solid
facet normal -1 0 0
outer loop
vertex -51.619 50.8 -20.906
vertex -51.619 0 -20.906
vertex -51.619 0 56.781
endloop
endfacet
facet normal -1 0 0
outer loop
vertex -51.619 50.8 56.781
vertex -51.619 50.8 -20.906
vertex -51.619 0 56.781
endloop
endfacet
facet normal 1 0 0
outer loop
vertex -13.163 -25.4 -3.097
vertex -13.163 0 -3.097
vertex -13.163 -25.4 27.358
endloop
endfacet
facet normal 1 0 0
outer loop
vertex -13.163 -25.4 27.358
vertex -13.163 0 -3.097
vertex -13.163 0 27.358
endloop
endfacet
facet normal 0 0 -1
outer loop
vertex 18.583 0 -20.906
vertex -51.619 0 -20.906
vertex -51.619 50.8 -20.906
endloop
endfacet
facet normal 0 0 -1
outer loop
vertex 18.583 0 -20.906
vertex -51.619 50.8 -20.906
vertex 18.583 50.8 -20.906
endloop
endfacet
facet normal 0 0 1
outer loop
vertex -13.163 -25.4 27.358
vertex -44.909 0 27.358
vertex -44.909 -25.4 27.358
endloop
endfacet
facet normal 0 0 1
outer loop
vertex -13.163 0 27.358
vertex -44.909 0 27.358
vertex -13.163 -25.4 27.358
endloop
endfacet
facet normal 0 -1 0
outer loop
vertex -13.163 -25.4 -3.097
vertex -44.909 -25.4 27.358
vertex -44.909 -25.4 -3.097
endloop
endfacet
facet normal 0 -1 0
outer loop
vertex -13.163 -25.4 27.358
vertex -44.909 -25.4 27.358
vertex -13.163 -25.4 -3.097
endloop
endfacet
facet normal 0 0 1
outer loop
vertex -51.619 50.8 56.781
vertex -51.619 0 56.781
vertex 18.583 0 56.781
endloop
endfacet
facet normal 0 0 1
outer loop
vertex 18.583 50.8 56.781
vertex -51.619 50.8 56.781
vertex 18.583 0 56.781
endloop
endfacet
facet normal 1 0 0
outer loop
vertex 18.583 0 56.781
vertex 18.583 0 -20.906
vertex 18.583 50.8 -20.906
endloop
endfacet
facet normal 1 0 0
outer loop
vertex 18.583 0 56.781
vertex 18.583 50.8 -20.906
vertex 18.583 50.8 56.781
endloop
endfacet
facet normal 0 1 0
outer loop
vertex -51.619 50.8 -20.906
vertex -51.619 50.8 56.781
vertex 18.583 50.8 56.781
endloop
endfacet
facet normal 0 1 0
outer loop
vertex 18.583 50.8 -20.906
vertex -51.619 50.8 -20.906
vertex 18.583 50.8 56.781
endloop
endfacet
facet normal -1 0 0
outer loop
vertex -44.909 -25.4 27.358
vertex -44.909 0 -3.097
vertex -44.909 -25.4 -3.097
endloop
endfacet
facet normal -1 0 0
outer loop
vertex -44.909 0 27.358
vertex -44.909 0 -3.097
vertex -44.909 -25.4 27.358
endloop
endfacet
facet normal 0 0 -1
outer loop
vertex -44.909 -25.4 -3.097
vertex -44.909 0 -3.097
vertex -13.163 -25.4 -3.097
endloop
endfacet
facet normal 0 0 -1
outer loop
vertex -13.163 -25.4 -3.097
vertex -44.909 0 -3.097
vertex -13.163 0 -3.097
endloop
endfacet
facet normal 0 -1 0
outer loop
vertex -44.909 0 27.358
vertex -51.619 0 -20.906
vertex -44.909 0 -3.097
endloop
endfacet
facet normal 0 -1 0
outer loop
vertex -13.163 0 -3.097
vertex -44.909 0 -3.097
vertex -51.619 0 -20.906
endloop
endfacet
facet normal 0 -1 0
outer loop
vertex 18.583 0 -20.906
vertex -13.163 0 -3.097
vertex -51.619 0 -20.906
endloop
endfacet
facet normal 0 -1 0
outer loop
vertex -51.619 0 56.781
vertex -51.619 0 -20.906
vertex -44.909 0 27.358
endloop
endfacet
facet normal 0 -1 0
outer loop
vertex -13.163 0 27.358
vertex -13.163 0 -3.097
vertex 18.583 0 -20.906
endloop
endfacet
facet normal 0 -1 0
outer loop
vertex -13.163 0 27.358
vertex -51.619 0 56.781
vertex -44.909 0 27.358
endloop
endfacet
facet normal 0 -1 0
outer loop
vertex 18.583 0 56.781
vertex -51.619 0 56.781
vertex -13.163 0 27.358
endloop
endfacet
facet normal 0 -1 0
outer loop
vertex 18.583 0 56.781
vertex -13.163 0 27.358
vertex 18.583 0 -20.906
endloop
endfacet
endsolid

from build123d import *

# Parameters (mm, degrees)
F0_W     = 70.202325
F0_H     = 77.687127
F0_W_2   = 41.811679
F0_H_2   = 39.230711
F1_DEPTH = 50.8
F2_W     = 31.745904
F2_H     = 30.455421
F3_DEPTH = 25.4


with BuildPart() as f1:
    # F0 (on Front) → F1 (new body)
    with BuildSketch(Plane.XZ):
        with Locations((-16.518192, 17.937724)):
            Rectangle(F0_W, F0_H)
        with Locations((-27.100162, 8.001)):
            Rectangle(F0_W_2, F0_H_2, mode=Mode.SUBTRACT)
        with Locations((-27.100162, 8.001)):
            Rectangle(F0_W_2, F0_H_2)
    extrude(amount=-F1_DEPTH)

    # F2 (on face) → F3 (join)
    with BuildSketch(Plane.XZ):
        with Locations((-29.035888, 12.130549)):
            Rectangle(F2_W, F2_H)
    extrude(amount=F3_DEPTH)


solid = f1.part
